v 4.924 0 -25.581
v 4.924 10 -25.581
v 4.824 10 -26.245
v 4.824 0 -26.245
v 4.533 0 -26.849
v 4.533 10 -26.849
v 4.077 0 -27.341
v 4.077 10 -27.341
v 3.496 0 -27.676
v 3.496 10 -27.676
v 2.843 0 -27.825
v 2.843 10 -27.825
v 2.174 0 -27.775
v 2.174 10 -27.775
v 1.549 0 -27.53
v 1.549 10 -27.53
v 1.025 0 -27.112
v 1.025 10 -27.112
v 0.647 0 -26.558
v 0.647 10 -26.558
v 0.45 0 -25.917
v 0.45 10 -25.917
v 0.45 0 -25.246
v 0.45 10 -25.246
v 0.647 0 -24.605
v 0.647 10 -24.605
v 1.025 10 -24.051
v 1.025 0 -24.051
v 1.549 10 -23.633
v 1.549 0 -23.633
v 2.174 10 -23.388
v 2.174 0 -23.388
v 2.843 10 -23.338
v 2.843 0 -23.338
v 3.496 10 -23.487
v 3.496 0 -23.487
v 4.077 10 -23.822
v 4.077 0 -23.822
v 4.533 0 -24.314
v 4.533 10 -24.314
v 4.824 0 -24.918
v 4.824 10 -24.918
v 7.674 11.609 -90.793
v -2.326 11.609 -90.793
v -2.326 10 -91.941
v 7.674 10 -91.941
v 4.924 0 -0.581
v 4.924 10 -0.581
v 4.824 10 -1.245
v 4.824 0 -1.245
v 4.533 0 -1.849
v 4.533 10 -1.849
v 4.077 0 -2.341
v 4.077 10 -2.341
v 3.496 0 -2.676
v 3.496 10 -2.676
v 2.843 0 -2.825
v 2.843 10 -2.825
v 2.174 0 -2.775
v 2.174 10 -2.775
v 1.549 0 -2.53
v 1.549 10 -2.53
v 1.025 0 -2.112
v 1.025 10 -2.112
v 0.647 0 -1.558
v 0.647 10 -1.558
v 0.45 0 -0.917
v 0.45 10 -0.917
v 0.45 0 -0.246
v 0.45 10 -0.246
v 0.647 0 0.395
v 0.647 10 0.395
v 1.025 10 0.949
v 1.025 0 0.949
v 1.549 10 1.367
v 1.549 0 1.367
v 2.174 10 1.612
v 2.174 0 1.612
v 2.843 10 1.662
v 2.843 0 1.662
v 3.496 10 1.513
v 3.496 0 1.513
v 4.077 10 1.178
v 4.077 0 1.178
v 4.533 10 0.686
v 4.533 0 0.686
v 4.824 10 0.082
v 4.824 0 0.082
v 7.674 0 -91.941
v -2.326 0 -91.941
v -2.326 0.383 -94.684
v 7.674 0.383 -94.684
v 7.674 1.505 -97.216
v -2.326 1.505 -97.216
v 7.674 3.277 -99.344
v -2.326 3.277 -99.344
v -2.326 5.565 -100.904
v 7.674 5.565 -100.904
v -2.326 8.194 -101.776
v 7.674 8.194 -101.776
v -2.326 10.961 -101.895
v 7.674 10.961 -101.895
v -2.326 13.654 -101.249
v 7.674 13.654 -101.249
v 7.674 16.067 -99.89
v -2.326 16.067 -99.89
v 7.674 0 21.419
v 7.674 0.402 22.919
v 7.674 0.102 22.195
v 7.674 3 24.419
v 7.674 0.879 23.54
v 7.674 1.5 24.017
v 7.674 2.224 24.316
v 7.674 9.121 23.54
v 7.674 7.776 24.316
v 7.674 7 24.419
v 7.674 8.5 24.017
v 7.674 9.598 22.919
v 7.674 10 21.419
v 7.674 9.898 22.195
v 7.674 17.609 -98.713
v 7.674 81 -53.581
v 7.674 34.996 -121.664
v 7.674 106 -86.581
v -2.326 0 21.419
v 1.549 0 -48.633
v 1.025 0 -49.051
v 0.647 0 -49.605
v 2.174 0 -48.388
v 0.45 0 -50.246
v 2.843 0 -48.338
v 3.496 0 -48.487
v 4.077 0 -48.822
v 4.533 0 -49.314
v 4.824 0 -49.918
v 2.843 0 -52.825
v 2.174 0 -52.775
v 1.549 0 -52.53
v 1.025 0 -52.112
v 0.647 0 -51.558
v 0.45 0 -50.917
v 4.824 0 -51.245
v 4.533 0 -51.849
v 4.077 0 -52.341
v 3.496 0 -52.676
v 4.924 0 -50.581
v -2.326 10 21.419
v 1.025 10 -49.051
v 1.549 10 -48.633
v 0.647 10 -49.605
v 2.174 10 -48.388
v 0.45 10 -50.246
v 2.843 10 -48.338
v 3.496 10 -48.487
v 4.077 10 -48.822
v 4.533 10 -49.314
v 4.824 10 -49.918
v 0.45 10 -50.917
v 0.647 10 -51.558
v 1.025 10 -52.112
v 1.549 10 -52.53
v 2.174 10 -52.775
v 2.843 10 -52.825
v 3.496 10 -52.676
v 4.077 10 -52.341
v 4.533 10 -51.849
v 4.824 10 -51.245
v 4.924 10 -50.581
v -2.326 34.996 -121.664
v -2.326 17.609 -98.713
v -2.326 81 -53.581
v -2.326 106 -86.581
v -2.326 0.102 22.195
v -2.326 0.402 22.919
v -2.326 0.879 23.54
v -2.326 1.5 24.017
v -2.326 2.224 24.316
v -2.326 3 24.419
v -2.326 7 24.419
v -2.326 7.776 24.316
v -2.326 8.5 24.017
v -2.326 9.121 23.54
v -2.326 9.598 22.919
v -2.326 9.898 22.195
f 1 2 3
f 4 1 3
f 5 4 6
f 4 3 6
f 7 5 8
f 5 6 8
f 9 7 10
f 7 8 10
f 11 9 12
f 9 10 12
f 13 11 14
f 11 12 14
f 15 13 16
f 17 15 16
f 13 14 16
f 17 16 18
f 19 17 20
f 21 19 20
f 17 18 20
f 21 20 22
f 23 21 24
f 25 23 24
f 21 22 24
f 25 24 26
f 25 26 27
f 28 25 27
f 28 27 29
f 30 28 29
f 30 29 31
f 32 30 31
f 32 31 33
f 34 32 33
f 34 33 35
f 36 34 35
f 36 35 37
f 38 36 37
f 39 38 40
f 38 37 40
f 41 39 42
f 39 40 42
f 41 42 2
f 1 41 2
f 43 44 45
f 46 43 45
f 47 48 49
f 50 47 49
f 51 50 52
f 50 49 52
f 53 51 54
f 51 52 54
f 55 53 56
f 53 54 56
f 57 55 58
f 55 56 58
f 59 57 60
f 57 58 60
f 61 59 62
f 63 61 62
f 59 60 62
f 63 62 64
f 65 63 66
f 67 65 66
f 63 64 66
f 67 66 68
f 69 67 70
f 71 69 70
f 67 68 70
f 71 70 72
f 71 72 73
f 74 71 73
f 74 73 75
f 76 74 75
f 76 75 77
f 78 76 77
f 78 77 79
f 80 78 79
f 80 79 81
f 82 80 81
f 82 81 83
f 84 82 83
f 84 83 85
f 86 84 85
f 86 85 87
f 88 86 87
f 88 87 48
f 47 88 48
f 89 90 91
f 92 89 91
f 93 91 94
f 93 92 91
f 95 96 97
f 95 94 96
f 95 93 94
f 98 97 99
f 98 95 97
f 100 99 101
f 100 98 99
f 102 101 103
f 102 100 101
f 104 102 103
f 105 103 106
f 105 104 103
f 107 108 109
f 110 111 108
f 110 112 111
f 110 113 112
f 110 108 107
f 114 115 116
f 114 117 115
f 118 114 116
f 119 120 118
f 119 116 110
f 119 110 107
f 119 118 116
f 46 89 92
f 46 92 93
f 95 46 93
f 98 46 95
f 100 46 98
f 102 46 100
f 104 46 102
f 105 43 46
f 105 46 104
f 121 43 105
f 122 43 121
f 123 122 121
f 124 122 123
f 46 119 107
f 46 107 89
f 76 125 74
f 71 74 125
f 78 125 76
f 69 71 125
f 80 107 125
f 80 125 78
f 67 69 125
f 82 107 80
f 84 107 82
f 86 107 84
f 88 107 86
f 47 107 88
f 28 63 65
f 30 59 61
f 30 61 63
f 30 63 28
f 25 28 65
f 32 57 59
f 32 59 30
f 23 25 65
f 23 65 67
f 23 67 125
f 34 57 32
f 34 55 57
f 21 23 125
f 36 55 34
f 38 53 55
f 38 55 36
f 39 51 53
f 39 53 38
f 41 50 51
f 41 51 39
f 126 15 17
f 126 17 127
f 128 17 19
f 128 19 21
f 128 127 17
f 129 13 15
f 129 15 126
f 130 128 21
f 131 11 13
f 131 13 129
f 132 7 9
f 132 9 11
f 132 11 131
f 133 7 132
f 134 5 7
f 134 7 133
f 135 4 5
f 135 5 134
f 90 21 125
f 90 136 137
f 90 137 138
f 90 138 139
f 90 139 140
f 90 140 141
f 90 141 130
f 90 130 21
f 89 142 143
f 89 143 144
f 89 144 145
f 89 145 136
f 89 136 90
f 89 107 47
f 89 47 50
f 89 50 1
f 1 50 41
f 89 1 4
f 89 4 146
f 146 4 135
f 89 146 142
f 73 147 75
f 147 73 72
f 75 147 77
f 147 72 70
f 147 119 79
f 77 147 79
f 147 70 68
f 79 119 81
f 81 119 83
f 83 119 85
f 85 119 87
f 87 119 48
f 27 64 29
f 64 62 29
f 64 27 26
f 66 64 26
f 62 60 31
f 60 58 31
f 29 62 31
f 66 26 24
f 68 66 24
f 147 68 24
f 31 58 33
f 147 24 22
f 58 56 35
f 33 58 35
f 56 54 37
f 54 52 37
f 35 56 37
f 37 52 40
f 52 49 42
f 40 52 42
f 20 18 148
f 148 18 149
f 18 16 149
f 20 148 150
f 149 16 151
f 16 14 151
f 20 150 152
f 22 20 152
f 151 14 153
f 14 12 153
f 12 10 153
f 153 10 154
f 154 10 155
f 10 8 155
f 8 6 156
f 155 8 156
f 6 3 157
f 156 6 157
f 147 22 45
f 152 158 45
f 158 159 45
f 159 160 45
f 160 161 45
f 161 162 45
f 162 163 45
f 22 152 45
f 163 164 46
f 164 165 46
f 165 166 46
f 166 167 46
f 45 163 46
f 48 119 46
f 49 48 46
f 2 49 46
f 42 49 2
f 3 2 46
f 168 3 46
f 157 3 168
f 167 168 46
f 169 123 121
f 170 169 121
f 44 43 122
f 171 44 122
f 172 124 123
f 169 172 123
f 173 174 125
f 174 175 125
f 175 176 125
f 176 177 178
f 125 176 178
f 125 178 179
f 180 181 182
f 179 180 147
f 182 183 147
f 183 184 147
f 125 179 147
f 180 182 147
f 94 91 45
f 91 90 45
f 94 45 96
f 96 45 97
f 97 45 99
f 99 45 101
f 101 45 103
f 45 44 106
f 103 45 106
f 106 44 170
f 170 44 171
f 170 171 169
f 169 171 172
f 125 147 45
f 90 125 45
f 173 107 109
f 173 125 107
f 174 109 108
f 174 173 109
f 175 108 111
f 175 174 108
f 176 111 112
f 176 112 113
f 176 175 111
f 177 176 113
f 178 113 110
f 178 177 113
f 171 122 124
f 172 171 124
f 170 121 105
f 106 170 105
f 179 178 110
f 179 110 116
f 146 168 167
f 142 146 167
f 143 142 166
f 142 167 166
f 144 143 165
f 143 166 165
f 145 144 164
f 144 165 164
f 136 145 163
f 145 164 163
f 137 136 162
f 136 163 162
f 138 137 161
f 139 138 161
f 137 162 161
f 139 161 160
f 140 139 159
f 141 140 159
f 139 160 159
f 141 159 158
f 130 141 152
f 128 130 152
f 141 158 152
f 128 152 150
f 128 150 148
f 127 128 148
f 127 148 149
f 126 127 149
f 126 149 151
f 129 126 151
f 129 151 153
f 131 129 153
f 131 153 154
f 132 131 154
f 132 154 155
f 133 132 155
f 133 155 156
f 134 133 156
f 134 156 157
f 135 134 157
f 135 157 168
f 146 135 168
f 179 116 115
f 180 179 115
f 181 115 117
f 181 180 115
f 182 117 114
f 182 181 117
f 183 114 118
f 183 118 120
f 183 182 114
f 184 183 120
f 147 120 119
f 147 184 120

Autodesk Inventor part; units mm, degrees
ref_plane "YZ Plane" through (0, 0, 0) normal (1, 0, 0) x (0, 1, 0)
ref_plane "XZ Plane" through (0, 0, 0) normal (0, 1, 0) x (-1, 0, 0)
ref_plane "XY Plane" through (0, 0, 0) normal (0, 0, 1) x (1, 0, 0)
sketch "Sketch1" plane through (0, 0, 0) normal (0, 1, 0) x (-1, 0, 0)
  line L0 (2.325581, 24.418605) -> (-7.674419, 24.418605)
  line L1 (-7.674419, 24.418605) -> (-7.674419, -75.581395)
  line L2 (-7.674419, -75.581395) -> (2.325581, -75.581395)
  line L3 (2.325581, -75.581395) -> (2.325581, 24.418605)
  point P0 (0, 0)
  dimension "d2" = 100
  dimension "d3" = 10
extrude "Extrusion1" add sketch "Sketch1" along normal blind 10
sketch "Sketch9" plane through (7.674419, 0, 24.418605) normal (1, 0, 0) x (0, 0, -1)
  line L0 (0, 10) -> (100, 10) projected
  line L1 (0, 0) -> (100, 0) projected
  line L2 (0, 10) -> (100, 10)
  line L3 (100, 10) -> (100, 0)
  line L4 (100, 0) -> (0, 0)
  line L5 (0, 0) -> (0, 10)
  point P0 (24.418605, 0)
extrude "Extrusion8" cut sketch "Sketch9" against normal blind 5
sketch "Sketch10" plane through (2.674419, 0, 24.418605) normal (1, 0, 0) x (0, 0, -1)
  line L0 (100, 0) -> (100, 10) projected
  line L1 (100, 10) -> (126, 10)
  line L2 (126, 10) -> (126, 29.842)
  line L3 (126, 29.842) -> (100, 10)
  line L4 (126, 29.842) -> (126, 19.842)
  line L5 (126, 19.842) -> (100, 0)
  point P0 (24.418605, 0)
  dimension "d44" = 19.842
  dimension "d45" = 26
  dimension "d46" = 10
extrude "Extrusion9" add sketch "Sketch10" against normal blind 5 contours L0 L1 L5 | L3 L2 L5 L1
sketch "Sketch12" plane through (2.674419, 0, 24.418605) normal (1, 0, 0) x (0, 0, -1)
  line L0 (100, 0) -> (0, 0)
  line L1 (126, 29.842) -> (126, 19.842)
  line L2 (99.933064, 0) -> (126, 19.842)
  line L3 (126, 19.842) -> (126, 29.842)
  line L4 (126, 29.842) -> (99.933064, 10)
  line L5 (99.933064, 10) -> (99.933064, 0)
  point P0 (24.418605, 0)
extrude "Extrusion10" add sketch "Sketch12" along normal blind 5
sketch "Sketch13" plane through (2.674419, 0, 24.418605) normal (1, 0, 0) x (0, 0, -1)
  line L0 (100, 10) -> (0, 10) projected
  line L1 (100, 0) -> (0, 0) projected
  line L2 (0, 10) -> (100, 10)
  line L3 (100, 10) -> (100, 0)
  line L4 (100, 0) -> (0, 0)
  line L5 (0, 0) -> (0, 10)
  point P0 (24.418605, 0)
extrude "Extrusion11" add sketch "Sketch13" along normal blind 5
sketch "Sketch2" plane through (0, 10, 0) normal (0, 1, 0) x (1, 0, 0)
  line L0 (-2.325581, -24.418605) -> (7.674419, -24.418605)
  line L1 (7.674419, -24.418605) -> (7.674419, 75.581395)
  line L2 (-2.325581, -24.418605) -> (7.674419, -24.418605)
  line L3 (2.674419, -24.418605) -> (2.674419, -14.418605)
  line L4 (2.674419, -14.418605) -> (2.674419, -4.418605)
  line L5 (2.674419, -4.418605) -> (2.674419, 10.581395)
  line L6 (2.674419, 10.581395) -> (2.674419, 25.581395)
  line L7 (7.674419, 75.581395) -> (-2.325581, 75.581395)
  line L8 (-2.325581, 75.581395) -> (7.674419, 75.581395)
  line L9 (2.674419, -24.418605) -> (2.674419, 25.581395)
  line L10 (2.674419, 25.581395) -> (7.674419, 25.581395)
  line L11 (2.674419, 25.581395) -> (-2.325581, 25.581395)
  line L12 (-2.325581, 75.581395) -> (-2.325581, -24.418605)
  line L13 (2.674419, 25.581395) -> (2.674419, 40.581395)
  line L14 (2.674419, 25.581395) -> (2.674419, 75.581395)
  line L15 (2.674419, 0.581395) -> (-2.325581, 0.581395)
  line L16 (2.674419, 0.581395) -> (7.674419, 0.581395)
  line L17 (2.674419, 50.581395) -> (-2.325581, 50.581395)
  line L18 (7.674419, 50.581395) -> (2.674419, 50.581395)
  circle A0 centre (2.674419, 0.581395) radius 2.25
  circle A1 centre (2.674419, 25.581395) radius 2.25
  circle A2 centre (2.674419, 50.581395) radius 2.25
  point P0 (0, 0)
  dimension "d28" = 4.5
  dimension "d29" = 4.5
  dimension "d30" = 4.5
extrude "Extrusion2" cut sketch "Sketch2" against normal blind 10 contours A0 L5 L15 | L15 L5 A0 | A1 L13 L11 | L11 L6 A1 | L16 A0 L5 | L5 A0 L16 | L10 A1 L6 | L13 A1 L10 | A2 L14 L17 | L17 L14 A2 | L18 A2 L14 | L14 A2 L18
sketch "Sketch14" plane through (7.674419, 0, 24.418605) normal (1, 0, 0) x (0, 0, -1)
  line L0 (100, 10) -> (0, 10) projected
  line L1 (126, 19.842) -> (100, 0) projected
  line L2 (100, 10) -> (100, 0)
  point P0 (24.418605, 0)
sketch "Sketch16" plane through (7.674419, 0, 24.418605) normal (1, 0, 0) x (0, 0, -1)
  line L0 (100, 10) -> (126, 29.842)
  line L1 (100, 10) -> (112.896482, 19.842)
  line L2 (112.896482, 19.842) -> (113.514198, 20.313412)
  line L3 (113.514198, 20.313412) -> (118.329114, 14.004177)
  line L4 (117.711399, 13.532765) -> (112.884086, 19.858243)
  line L5 (117.711399, 13.532765) -> (118.329114, 14.004177)
  point P0 (24.418605, 0)
  dimension "d60" = 16.22295
  dimension "d61" = 0.77705
extrude "Extrusion13" add sketch "Sketch16" against normal blind 10
sketch "Sketch20" plane through (7.674419, 0, 24.418605) normal (1, 0, 0) x (0, 0, -1)
  line L0 (100, 10) -> (0, 10) projected
  line L1 (100, 10) -> (128, 10)
  line L2 (128, 10) -> (128, 0)
  line L3 (128, 0) -> (100, 0)
  line L4 (100, 0) -> (100, 10)
  line L5 (126, 29.842) -> (100, 10) projected
  line L6 (100, 10) -> (126, 10)
  line L7 (126, 10) -> (126, 29.842)
  line L8 (126, 29.842) -> (100, 29.842)
  line L9 (100, 29.842) -> (100, 10)
  point P0 (24.418605, 0)
  dimension "d77" = 28
extrude "Extrusion17" add sketch "Sketch20" against normal blind 10 contours L1 L2 L3 L4
sketch "Sketch21" plane through (7.674419, 0, 24.418605) normal (1, 0, 0) x (0, 0, -1)
  line L0 (128, 0) -> (128, 10)
  line L1 (128, 0) -> (151.87052, 18.170101)
  line L2 (113.070317, 10) -> (126, 19.842)
  line L3 (128, 10) -> (151.239467, 27.689747)
  line L4 (151.87052, 18.170101) -> (151.87052, 28.170101)
  line L5 (151.87052, 28.170101) -> (151.239467, 27.689747)
  line L6 (100, 10) -> (0, 10)
  line L7 (126, 29.842) -> (100, 29.842)
  line L8 (100, 29.842) -> (100, 10)
  line L9 (100, 10) -> (126, 10)
  line L10 (126, 10) -> (126, 29.842)
  point P0 (24.418605, 0)
extrude "Extrusion18" add sketch "Sketch21" against normal blind 10 contours L0 L3 L5 L4 L1
sketch "Sketch22" plane through (7.674419, 0, 24.418605) normal (1, 0, 0) x (0, 0, -1)
  line L0 (100, 10) -> (126, 29.842) projected
  line L1 (100, 10) -> (0, 10) projected
  line L2 (126, 29.842) -> (100, 29.842)
  line L3 (100, 29.842) -> (100, 10)
  line L4 (100, 10) -> (126, 10)
  line L5 (126, 10) -> (126, 29.842)
  point P0 (24.418605, 0)
extrude "Extrusion19" cut sketch "Sketch22" against normal blind 10
sketch "Sketch23" plane through (7.674419, 0, 24.418605) normal (1, 0, 0) x (0, 0, -1)
  line L0 (151.87052, 18.170101) -> (128, 0)
  line L1 (141.891396, 10.57405) -> (136.99663, 17.004426)
  line L2 (128, 0) -> (151.87052, 18.170101)
  line L3 (128, 10) -> (151.87052, 28.170101)
  line L4 (137.071931, 16.905501) -> (151.87052, 28.170101)
  line L5 (151.87052, 28.170101) -> (151.87052, 18.170101)
  line L6 (141.891396, 10.57405) -> (151.87052, 18.170101)
  point P0 (24.418605, 0)
  point P1 (137.071931, 16.905501)
extrude "Extrusion20" cut sketch "Sketch23" against normal blind 10
sketch "Sketch24" plane through (7.674419, 0, 24.418605) normal (1, 0, 0) x (0, 0, -1)
  line L0 (141.891396, 10.57405) -> (137.071931, 16.905501)
  line L1 (137.071931, 16.905501) -> (120.042183, 39.277911)
  line L2 (120.042183, 39.277911) -> (114.78111, 35.273213)
  line L3 (114.78111, 35.273213) -> (131.810859, 12.900804)
  line L4 (128, 10) -> (137.071931, 16.905501)
  line L5 (130.433663, 25.626361) -> (125.172591, 21.621663)
  point P0 (24.418605, 0)
extrude "Extrusion21" add sketch "Sketch24" against normal blind 10 contours L4 L3 L5 L1
sketch "Sketch25" plane through (7.674419, 0, 24.418605) normal (1, 0, 0) x (0, 0, -1)
  circle A0 centre (130.028114, 20.963065) radius 1.414214
  line L0 (128, 0) -> (141.891396, 10.57405)
  point P0 (24.418605, 0)
  dimension "d88" = 15.452
extrude "Extrusion22" cut sketch "Sketch25" against normal blind 10
sketch "Sketch26" plane through (7.674419, 0, 24.418605) normal (1, 0, 0) x (0, 0, -1)
  line L0 (146.180534, 13.38523) -> (129.005429, 0.311641)
  line L1 (128, 0) -> (141.891396, 10.57405)
  line L2 (129.005429, 0.311641) -> (127.101128, -1.137903)
  line L3 (128, 0) -> (128.596019, 0)
  line L4 (128, 10) -> (141.733271, 10)
  point P0 (24.418605, 0)
  point P1 (137.592982, 6.848436)
  point P2 (141.137252, 10)
  dimension "d89" = 0.361
extrude "Extrusion23" add sketch "Sketch26" against normal blind 10
sketch "Sketch27" plane through (7.674419, 0, 24.418605) normal (1, 0, 0) x (0, 0, -1)
  line L0 (128.596019, 0) -> (141.733271, 10)
  line L1 (141.733271, 10) -> (143.644553, 11.454856)
  line L2 (141.733271, 10) -> (141.137252, 10)
  line L3 (141.733271, 10) -> (141.137252, 10)
  line L4 (141.137252, 10) -> (143.4259, 11.742106)
  line L5 (143.4259, 11.742106) -> (143.644553, 11.454856)
  line L6 (143.4259, 11.742106) -> (141.608381, 14.129826)
  line L7 (141.608381, 14.129826) -> (140.073877, 12.96177)
  line L8 (130.433663, 25.626361) -> (141.891396, 10.57405)
  line L9 (141.891396, 10.57405) -> (140.073877, 12.96177)
  line L10 (141.891396, 10.57405) -> (130.433663, 25.626361)
  point P0 (24.418605, 0)
  dimension "d92" = 2.402
extrude "Extrusion24" add sketch "Sketch27" against normal blind 10
sketch "Sketch28" plane through (7.674419, 0, 24.418605) normal (1, 0, 0) x (0, 0, -1)
  line L0 (129.774875, 26.828636) -> (140.680759, 12.501302)
  line L1 (140.073877, 12.96177) -> (130.433663, 25.626361)
  line L2 (130.433663, 25.626361) -> (130.595987, 25.749921)
  line L3 (140.073877, 12.96177) -> (141.608381, 14.129826)
  line L4 (140.073877, 12.96177) -> (140.2362, 13.08533)
  line L5 (140.073877, 12.96177) -> (130.433663, 25.626361)
  point P0 (24.418605, 0)
  dimension "d95" = 0.204
extrude "Extrusion25" add sketch "Sketch28" against normal blind 10
sketch "Sketch29" plane through (7.674419, 0, 24.418605) normal (1, 0, 0) x (0, 0, -1)
  line L0 (130.595987, 25.749921) -> (140.2362, 13.08533)
  line L1 (130.595987, 25.749921) -> (115.000185, 13.878487)
  line L2 (143.644553, 11.454856) -> (128.596019, 0)
  line L3 (137.494115, 6.773179) -> (119.565826, 30.326023)
  line L4 (122.798086, 19.814204) -> (116.546182, 28.027488)
  circle A0 centre (116.546182, 28.027488) radius 3
  line L5 (116.546182, 28.027488) -> (116.546182, 10)
  line L6 (0, 10) -> (128, 10)
  line L7 (128, 10) -> (100, 10)
  line L8 (116.546182, 28.027488) -> (110.546182, 28.027488)
  line L9 (110.546182, 28.027488) -> (110.546182, 34.027488)
  line L10 (116.546182, 28.027488) -> (122.546182, 28.027488)
  line L11 (122.546182, 28.027488) -> (122.546182, 10)
  line L12 (110.546182, 34.027488) -> (122.546182, 34.027488)
  line L13 (122.546182, 34.027488) -> (122.546182, 10)
  line L14 (122.546182, 10) -> (110.546182, 10)
  line L15 (110.546182, 10) -> (110.546182, 34.027488)
  point P0 (24.418605, 0)
  point P1 (122.546182, 28.027488)
  point P2 (110.546182, 28.027488)
  point P3 (110.546182, 10)
  point P4 (122.546182, 10)
  dimension "d98" = 19.6
  dimension "d99" = 29.6
  dimension "d100" = 6
  dimension "d101" = 6
  dimension "d102" = 6
  dimension "d103" = 6
extrude "Extrusion26" add sketch "Sketch29" against normal blind 10 contours L11 L4 A0 L10 L3 | L3 L10 L11 | L11 L6 L5 L1 | L1 L5 A0 L4 L11 | L10 A0 L8 L9 L12 L13 | L5 L6 L15 L8 A0
sketch "Sketch30" plane through (7.674419, 0, 24.418605) normal (1, 0, 0) x (0, 0, -1)
  line L0 (122.546182, 34.027488) -> (122.546182, 10)
  line L1 (122.546182, 34.027488) -> (144, 34.027488)
  line L2 (144, 34.027488) -> (144, 0)
  line L3 (144, 0) -> (122.546182, 0)
  line L4 (122.546182, 0) -> (122.546182, 34.027488)
  point P0 (24.418605, 0)
extrude "Extrusion27" cut sketch "Sketch30" against normal blind 10
sketch "Sketch31" plane through (7.674419, 0, 24.418605) normal (1, 0, 0) x (0, 0, -1)
  line L0 (110.546182, 34.027488) -> (110.546182, 10)
  line L1 (110.546182, 10) -> (113, 10)
  line L2 (110.546182, 10) -> (114, 10)
  line L3 (114, 10) -> (114, 17)
  line L4 (114, 17) -> (110.546182, 17)
  line L5 (110.546182, 17) -> (110.546182, 10)
  point P0 (24.418605, 0)
extrude "Extrusion28" cut sketch "Sketch31" against normal blind 10
sketch "Sketch32" plane through (7.674419, 0, 24.418605) normal (1, 0, 0) x (0, 0, -1)
  line L0 (114, 17) -> (110.546182, 17)
  line L1 (114, 17) -> (114, 10)
  line L2 (110.546182, 17) -> (114, 10)
  line L3 (114, 10) -> (114, 17)
  line L4 (114, 17) -> (110.546182, 17)
  point P0 (24.418605, 0)
extrude "Extrusion29" add sketch "Sketch32" against normal blind 10
sketch "Sketch33" plane through (7.674419, 0, 24.418605) normal (1, 0, 0) x (0, 0, -1)
  line L0 (100, 10.050951) -> (99.933064, 10)
  line L1 (100, 10.050951) -> (99.933064, 10)
  line L2 (99.933064, 10) -> (100, 10)
  line L3 (99.933064, 10) -> (100, 10)
  line L4 (100, 10) -> (100, 10.050951)
  line L5 (100, 10) -> (100, 10.050951)
  point P0 (24.418605, 0)
extrude "Extrusion30" cut sketch "Sketch33" against normal blind 10
sketch "Sketch34" plane through (7.674419, 0, 24.418605) normal (1, 0, 0) x (0, 0, -1)
  line L0 (119.614525, 21.220993) -> (127.725416, 4.782304)
  line L1 (110.546182, 17) -> (114, 10)
  line L2 (127.725416, 4.782304) -> (130.085017, 0)
  line L3 (122.546182, 0) -> (0, 0)
  line L4 (116.504679, 0) -> (130.085017, 0)
  line L5 (127.725416, 4.782304) -> (130.085017, 0)
  line L6 (122.546182, 34.027488) -> (122.546182, 0)
  line L7 (122.546182, 15.279278) -> (122.546182, 0)
  point P0 (24.418605, 0)
  dimension "d114" = 10
extrude "Extrusion31" add sketch "Sketch34" against normal blind 10
fillet "Fillet2" radius 2 1 edges at (2.6744, 0, -105.6664)
fillet "Fillet3" radius 3 6 edges at (2.6744, 15.2793, -98.1276) (2.6744, 34.0275, -98.1276) (2.6744, 34.0275, -86.1276) (2.6744, 17, -86.1276) (2.6744, 10, 24.4186) (2.6744, 0, 24.4186)
sketch "Sketch35" plane through (7.674419, 0, 24.418605) normal (1, 0, 0) x (0, 0, -1)
  arc A0 (110.546182, 17.699829) -> (110.855838, 16.372406) centre (113.546182, 17.699829) ccw
  line L0 (110.546182, 17.699829) -> (115.999721, 10.054757)
  line L1 (115.999721, 10.054757) -> (113.999721, 10.054757)
  line L2 (110.546182, 17.699829) -> (110.546182, 10.054757)
  line L3 (110.546182, 10.054757) -> (115.999721, 10.054757)
  line L4 (114, 10) -> (3, 10)
  line L5 (110.546182, 10.054757) -> (115.999721, 10.054757)
  point P0 (24.418605, 0)
  point P1 (3, 10)
extrude "Extrusion32" cut sketch "Sketch35" against normal blind 10
sketch "Sketch36" plane through (7.674419, 0, 24.418605) normal (1, 0, 0) x (0, 0, -1)
  line L0 (107, 10) -> (116.657393, 10)
  line L1 (110.546182, 17.699829) -> (115.999721, 10.054757)
  line L2 (3, 0) -> (126.868013, 0)
  line L3 (126, 19.842105) -> (100, 0)
  line L4 (114.482105, 12.631671) -> (116.575951, 9.696402)
  line L5 (115.211679, 11.608913) -> (109.490162, 19.106074)
  line L6 (110.546182, 31.027488) -> (110.546182, 17.699829)
  line L7 (110.546182, 17.699829) -> (110.546182, 10)
  line L8 (110.546182, 10) -> (116.359382, 10)
  point P0 (24.418605, 0)
  point P1 (110.546182, 17.722323)
  dimension "d121" = 0.261
extrude "Extrusion33" cut sketch "Sketch36" against normal blind 10
fillet "Fillet5" radius 3 1 edges at (2.6744, 17.7223, -86.1276)
sketch "Sketch37" plane through (7.674419, 0, 24.418605) normal (1, 0, 0) x (0, 0, -1)
  line L0 (117.932308, 24.527287) -> (136.6505, 0)
  line L1 (111.161328, 16.91627) -> (115.211679, 11.608913)
  line L2 (126.868013, 0) -> (3, 0)
  line L3 (122.31822, 0) -> (151, 0)
  line L4 (122.56441, 18.457636) -> (122.56441, 0)
  line L5 (122, 19.197208) -> (122, 0)
  point P0 (24.418605, 0)
  dimension "d126" = 10
extrude "Extrusion34" add sketch "Sketch37" against normal blind 10
fillet "Fillet6" radius 3 2 edges at (2.6744, 0, -112.2319) (2.6744, 18.4815, -98.1276)
sketch "Sketch38" plane through (7.674419, 0, 24.418605) normal (1, 0, 0) x (0, 0, -1)
  line L0 (116.359382, 10) -> (115.211679, 11.608913)
  circle A0 centre (116.359382, 10) radius 10
  line L1 (116.359382, 0) -> (138.255518, 0)
  line L2 (123.161328, 17.675467) -> (132.972064, 4.82002)
  line L3 (125.598358, 14.482118) -> (136.6505, 0)
  line L4 (122.546182, 31.027488) -> (122.546182, 19.495487)
  line L5 (122.546182, 23.627159) -> (122.546182, 15.627103)
  line L6 (127.492606, 12) -> (119.861027, 22)
  line L7 (122.546182, 18.376494) -> (125.877807, 14.010917)
  line L8 (132.972064, 4.82002) -> (123.161328, 17.675467)
  line L9 (122.546182, 18.376494) -> (122.546182, 19.495487)
  line L10 (136.6505, 0) -> (122.546182, 19.495487)
  point P0 (24.418605, 0)
  point P1 (124.308895, 16.066733)
  dimension "d130" = 20
extrude "Extrusion35" cut sketch "Sketch38" against normal blind 10 contours A0 L7 L5 L6 L2 L3 L1 | L3 L2 L6 L5 L10
sketch "Sketch39" plane through (7.674419, 0, 24.418605) normal (1, 0, 0) x (0, 0, -1)
  point P0 (24.418605, 0)
sketch "Sketch41" plane through (7.674419, 0, 24.418605) normal (1, 0, 0) x (0, 0, -1)
  line L0 (111.161328, 16.91627) -> (115.211679, 11.608913)
  line L1 (115.211679, 11.608913) -> (123.086785, 17.618862)
  line L2 (123.086785, 17.618862) -> (124, 35)
  line L3 (124, 35) -> (108, 35)
  line L4 (108, 35) -> (109, 11.608913)
  line L5 (109, 11.608913) -> (115.211679, 11.608913)
  point P0 (24.418605, 0)
extrude "Extrusion37" cut sketch "Sketch41" against normal blind 10
sketch "Sketch42" plane through (7.674419, 0, 24.418605) normal (1, 0, 0) x (0, 0, -1)
  line L0 (115.211679, 11.608913) -> (78, 81)
  line L1 (78, 81) -> (111, 106)
  line L2 (111, 106) -> (146.082916, 34.996214)
  line L3 (146.082916, 34.996214) -> (115.211679, 11.608913)
  point P0 (24.418605, 0)
extrude "Extrusion38" add sketch "Sketch42" against normal blind 10
equation "\"d0\" = d3"
properties part number "rod"
